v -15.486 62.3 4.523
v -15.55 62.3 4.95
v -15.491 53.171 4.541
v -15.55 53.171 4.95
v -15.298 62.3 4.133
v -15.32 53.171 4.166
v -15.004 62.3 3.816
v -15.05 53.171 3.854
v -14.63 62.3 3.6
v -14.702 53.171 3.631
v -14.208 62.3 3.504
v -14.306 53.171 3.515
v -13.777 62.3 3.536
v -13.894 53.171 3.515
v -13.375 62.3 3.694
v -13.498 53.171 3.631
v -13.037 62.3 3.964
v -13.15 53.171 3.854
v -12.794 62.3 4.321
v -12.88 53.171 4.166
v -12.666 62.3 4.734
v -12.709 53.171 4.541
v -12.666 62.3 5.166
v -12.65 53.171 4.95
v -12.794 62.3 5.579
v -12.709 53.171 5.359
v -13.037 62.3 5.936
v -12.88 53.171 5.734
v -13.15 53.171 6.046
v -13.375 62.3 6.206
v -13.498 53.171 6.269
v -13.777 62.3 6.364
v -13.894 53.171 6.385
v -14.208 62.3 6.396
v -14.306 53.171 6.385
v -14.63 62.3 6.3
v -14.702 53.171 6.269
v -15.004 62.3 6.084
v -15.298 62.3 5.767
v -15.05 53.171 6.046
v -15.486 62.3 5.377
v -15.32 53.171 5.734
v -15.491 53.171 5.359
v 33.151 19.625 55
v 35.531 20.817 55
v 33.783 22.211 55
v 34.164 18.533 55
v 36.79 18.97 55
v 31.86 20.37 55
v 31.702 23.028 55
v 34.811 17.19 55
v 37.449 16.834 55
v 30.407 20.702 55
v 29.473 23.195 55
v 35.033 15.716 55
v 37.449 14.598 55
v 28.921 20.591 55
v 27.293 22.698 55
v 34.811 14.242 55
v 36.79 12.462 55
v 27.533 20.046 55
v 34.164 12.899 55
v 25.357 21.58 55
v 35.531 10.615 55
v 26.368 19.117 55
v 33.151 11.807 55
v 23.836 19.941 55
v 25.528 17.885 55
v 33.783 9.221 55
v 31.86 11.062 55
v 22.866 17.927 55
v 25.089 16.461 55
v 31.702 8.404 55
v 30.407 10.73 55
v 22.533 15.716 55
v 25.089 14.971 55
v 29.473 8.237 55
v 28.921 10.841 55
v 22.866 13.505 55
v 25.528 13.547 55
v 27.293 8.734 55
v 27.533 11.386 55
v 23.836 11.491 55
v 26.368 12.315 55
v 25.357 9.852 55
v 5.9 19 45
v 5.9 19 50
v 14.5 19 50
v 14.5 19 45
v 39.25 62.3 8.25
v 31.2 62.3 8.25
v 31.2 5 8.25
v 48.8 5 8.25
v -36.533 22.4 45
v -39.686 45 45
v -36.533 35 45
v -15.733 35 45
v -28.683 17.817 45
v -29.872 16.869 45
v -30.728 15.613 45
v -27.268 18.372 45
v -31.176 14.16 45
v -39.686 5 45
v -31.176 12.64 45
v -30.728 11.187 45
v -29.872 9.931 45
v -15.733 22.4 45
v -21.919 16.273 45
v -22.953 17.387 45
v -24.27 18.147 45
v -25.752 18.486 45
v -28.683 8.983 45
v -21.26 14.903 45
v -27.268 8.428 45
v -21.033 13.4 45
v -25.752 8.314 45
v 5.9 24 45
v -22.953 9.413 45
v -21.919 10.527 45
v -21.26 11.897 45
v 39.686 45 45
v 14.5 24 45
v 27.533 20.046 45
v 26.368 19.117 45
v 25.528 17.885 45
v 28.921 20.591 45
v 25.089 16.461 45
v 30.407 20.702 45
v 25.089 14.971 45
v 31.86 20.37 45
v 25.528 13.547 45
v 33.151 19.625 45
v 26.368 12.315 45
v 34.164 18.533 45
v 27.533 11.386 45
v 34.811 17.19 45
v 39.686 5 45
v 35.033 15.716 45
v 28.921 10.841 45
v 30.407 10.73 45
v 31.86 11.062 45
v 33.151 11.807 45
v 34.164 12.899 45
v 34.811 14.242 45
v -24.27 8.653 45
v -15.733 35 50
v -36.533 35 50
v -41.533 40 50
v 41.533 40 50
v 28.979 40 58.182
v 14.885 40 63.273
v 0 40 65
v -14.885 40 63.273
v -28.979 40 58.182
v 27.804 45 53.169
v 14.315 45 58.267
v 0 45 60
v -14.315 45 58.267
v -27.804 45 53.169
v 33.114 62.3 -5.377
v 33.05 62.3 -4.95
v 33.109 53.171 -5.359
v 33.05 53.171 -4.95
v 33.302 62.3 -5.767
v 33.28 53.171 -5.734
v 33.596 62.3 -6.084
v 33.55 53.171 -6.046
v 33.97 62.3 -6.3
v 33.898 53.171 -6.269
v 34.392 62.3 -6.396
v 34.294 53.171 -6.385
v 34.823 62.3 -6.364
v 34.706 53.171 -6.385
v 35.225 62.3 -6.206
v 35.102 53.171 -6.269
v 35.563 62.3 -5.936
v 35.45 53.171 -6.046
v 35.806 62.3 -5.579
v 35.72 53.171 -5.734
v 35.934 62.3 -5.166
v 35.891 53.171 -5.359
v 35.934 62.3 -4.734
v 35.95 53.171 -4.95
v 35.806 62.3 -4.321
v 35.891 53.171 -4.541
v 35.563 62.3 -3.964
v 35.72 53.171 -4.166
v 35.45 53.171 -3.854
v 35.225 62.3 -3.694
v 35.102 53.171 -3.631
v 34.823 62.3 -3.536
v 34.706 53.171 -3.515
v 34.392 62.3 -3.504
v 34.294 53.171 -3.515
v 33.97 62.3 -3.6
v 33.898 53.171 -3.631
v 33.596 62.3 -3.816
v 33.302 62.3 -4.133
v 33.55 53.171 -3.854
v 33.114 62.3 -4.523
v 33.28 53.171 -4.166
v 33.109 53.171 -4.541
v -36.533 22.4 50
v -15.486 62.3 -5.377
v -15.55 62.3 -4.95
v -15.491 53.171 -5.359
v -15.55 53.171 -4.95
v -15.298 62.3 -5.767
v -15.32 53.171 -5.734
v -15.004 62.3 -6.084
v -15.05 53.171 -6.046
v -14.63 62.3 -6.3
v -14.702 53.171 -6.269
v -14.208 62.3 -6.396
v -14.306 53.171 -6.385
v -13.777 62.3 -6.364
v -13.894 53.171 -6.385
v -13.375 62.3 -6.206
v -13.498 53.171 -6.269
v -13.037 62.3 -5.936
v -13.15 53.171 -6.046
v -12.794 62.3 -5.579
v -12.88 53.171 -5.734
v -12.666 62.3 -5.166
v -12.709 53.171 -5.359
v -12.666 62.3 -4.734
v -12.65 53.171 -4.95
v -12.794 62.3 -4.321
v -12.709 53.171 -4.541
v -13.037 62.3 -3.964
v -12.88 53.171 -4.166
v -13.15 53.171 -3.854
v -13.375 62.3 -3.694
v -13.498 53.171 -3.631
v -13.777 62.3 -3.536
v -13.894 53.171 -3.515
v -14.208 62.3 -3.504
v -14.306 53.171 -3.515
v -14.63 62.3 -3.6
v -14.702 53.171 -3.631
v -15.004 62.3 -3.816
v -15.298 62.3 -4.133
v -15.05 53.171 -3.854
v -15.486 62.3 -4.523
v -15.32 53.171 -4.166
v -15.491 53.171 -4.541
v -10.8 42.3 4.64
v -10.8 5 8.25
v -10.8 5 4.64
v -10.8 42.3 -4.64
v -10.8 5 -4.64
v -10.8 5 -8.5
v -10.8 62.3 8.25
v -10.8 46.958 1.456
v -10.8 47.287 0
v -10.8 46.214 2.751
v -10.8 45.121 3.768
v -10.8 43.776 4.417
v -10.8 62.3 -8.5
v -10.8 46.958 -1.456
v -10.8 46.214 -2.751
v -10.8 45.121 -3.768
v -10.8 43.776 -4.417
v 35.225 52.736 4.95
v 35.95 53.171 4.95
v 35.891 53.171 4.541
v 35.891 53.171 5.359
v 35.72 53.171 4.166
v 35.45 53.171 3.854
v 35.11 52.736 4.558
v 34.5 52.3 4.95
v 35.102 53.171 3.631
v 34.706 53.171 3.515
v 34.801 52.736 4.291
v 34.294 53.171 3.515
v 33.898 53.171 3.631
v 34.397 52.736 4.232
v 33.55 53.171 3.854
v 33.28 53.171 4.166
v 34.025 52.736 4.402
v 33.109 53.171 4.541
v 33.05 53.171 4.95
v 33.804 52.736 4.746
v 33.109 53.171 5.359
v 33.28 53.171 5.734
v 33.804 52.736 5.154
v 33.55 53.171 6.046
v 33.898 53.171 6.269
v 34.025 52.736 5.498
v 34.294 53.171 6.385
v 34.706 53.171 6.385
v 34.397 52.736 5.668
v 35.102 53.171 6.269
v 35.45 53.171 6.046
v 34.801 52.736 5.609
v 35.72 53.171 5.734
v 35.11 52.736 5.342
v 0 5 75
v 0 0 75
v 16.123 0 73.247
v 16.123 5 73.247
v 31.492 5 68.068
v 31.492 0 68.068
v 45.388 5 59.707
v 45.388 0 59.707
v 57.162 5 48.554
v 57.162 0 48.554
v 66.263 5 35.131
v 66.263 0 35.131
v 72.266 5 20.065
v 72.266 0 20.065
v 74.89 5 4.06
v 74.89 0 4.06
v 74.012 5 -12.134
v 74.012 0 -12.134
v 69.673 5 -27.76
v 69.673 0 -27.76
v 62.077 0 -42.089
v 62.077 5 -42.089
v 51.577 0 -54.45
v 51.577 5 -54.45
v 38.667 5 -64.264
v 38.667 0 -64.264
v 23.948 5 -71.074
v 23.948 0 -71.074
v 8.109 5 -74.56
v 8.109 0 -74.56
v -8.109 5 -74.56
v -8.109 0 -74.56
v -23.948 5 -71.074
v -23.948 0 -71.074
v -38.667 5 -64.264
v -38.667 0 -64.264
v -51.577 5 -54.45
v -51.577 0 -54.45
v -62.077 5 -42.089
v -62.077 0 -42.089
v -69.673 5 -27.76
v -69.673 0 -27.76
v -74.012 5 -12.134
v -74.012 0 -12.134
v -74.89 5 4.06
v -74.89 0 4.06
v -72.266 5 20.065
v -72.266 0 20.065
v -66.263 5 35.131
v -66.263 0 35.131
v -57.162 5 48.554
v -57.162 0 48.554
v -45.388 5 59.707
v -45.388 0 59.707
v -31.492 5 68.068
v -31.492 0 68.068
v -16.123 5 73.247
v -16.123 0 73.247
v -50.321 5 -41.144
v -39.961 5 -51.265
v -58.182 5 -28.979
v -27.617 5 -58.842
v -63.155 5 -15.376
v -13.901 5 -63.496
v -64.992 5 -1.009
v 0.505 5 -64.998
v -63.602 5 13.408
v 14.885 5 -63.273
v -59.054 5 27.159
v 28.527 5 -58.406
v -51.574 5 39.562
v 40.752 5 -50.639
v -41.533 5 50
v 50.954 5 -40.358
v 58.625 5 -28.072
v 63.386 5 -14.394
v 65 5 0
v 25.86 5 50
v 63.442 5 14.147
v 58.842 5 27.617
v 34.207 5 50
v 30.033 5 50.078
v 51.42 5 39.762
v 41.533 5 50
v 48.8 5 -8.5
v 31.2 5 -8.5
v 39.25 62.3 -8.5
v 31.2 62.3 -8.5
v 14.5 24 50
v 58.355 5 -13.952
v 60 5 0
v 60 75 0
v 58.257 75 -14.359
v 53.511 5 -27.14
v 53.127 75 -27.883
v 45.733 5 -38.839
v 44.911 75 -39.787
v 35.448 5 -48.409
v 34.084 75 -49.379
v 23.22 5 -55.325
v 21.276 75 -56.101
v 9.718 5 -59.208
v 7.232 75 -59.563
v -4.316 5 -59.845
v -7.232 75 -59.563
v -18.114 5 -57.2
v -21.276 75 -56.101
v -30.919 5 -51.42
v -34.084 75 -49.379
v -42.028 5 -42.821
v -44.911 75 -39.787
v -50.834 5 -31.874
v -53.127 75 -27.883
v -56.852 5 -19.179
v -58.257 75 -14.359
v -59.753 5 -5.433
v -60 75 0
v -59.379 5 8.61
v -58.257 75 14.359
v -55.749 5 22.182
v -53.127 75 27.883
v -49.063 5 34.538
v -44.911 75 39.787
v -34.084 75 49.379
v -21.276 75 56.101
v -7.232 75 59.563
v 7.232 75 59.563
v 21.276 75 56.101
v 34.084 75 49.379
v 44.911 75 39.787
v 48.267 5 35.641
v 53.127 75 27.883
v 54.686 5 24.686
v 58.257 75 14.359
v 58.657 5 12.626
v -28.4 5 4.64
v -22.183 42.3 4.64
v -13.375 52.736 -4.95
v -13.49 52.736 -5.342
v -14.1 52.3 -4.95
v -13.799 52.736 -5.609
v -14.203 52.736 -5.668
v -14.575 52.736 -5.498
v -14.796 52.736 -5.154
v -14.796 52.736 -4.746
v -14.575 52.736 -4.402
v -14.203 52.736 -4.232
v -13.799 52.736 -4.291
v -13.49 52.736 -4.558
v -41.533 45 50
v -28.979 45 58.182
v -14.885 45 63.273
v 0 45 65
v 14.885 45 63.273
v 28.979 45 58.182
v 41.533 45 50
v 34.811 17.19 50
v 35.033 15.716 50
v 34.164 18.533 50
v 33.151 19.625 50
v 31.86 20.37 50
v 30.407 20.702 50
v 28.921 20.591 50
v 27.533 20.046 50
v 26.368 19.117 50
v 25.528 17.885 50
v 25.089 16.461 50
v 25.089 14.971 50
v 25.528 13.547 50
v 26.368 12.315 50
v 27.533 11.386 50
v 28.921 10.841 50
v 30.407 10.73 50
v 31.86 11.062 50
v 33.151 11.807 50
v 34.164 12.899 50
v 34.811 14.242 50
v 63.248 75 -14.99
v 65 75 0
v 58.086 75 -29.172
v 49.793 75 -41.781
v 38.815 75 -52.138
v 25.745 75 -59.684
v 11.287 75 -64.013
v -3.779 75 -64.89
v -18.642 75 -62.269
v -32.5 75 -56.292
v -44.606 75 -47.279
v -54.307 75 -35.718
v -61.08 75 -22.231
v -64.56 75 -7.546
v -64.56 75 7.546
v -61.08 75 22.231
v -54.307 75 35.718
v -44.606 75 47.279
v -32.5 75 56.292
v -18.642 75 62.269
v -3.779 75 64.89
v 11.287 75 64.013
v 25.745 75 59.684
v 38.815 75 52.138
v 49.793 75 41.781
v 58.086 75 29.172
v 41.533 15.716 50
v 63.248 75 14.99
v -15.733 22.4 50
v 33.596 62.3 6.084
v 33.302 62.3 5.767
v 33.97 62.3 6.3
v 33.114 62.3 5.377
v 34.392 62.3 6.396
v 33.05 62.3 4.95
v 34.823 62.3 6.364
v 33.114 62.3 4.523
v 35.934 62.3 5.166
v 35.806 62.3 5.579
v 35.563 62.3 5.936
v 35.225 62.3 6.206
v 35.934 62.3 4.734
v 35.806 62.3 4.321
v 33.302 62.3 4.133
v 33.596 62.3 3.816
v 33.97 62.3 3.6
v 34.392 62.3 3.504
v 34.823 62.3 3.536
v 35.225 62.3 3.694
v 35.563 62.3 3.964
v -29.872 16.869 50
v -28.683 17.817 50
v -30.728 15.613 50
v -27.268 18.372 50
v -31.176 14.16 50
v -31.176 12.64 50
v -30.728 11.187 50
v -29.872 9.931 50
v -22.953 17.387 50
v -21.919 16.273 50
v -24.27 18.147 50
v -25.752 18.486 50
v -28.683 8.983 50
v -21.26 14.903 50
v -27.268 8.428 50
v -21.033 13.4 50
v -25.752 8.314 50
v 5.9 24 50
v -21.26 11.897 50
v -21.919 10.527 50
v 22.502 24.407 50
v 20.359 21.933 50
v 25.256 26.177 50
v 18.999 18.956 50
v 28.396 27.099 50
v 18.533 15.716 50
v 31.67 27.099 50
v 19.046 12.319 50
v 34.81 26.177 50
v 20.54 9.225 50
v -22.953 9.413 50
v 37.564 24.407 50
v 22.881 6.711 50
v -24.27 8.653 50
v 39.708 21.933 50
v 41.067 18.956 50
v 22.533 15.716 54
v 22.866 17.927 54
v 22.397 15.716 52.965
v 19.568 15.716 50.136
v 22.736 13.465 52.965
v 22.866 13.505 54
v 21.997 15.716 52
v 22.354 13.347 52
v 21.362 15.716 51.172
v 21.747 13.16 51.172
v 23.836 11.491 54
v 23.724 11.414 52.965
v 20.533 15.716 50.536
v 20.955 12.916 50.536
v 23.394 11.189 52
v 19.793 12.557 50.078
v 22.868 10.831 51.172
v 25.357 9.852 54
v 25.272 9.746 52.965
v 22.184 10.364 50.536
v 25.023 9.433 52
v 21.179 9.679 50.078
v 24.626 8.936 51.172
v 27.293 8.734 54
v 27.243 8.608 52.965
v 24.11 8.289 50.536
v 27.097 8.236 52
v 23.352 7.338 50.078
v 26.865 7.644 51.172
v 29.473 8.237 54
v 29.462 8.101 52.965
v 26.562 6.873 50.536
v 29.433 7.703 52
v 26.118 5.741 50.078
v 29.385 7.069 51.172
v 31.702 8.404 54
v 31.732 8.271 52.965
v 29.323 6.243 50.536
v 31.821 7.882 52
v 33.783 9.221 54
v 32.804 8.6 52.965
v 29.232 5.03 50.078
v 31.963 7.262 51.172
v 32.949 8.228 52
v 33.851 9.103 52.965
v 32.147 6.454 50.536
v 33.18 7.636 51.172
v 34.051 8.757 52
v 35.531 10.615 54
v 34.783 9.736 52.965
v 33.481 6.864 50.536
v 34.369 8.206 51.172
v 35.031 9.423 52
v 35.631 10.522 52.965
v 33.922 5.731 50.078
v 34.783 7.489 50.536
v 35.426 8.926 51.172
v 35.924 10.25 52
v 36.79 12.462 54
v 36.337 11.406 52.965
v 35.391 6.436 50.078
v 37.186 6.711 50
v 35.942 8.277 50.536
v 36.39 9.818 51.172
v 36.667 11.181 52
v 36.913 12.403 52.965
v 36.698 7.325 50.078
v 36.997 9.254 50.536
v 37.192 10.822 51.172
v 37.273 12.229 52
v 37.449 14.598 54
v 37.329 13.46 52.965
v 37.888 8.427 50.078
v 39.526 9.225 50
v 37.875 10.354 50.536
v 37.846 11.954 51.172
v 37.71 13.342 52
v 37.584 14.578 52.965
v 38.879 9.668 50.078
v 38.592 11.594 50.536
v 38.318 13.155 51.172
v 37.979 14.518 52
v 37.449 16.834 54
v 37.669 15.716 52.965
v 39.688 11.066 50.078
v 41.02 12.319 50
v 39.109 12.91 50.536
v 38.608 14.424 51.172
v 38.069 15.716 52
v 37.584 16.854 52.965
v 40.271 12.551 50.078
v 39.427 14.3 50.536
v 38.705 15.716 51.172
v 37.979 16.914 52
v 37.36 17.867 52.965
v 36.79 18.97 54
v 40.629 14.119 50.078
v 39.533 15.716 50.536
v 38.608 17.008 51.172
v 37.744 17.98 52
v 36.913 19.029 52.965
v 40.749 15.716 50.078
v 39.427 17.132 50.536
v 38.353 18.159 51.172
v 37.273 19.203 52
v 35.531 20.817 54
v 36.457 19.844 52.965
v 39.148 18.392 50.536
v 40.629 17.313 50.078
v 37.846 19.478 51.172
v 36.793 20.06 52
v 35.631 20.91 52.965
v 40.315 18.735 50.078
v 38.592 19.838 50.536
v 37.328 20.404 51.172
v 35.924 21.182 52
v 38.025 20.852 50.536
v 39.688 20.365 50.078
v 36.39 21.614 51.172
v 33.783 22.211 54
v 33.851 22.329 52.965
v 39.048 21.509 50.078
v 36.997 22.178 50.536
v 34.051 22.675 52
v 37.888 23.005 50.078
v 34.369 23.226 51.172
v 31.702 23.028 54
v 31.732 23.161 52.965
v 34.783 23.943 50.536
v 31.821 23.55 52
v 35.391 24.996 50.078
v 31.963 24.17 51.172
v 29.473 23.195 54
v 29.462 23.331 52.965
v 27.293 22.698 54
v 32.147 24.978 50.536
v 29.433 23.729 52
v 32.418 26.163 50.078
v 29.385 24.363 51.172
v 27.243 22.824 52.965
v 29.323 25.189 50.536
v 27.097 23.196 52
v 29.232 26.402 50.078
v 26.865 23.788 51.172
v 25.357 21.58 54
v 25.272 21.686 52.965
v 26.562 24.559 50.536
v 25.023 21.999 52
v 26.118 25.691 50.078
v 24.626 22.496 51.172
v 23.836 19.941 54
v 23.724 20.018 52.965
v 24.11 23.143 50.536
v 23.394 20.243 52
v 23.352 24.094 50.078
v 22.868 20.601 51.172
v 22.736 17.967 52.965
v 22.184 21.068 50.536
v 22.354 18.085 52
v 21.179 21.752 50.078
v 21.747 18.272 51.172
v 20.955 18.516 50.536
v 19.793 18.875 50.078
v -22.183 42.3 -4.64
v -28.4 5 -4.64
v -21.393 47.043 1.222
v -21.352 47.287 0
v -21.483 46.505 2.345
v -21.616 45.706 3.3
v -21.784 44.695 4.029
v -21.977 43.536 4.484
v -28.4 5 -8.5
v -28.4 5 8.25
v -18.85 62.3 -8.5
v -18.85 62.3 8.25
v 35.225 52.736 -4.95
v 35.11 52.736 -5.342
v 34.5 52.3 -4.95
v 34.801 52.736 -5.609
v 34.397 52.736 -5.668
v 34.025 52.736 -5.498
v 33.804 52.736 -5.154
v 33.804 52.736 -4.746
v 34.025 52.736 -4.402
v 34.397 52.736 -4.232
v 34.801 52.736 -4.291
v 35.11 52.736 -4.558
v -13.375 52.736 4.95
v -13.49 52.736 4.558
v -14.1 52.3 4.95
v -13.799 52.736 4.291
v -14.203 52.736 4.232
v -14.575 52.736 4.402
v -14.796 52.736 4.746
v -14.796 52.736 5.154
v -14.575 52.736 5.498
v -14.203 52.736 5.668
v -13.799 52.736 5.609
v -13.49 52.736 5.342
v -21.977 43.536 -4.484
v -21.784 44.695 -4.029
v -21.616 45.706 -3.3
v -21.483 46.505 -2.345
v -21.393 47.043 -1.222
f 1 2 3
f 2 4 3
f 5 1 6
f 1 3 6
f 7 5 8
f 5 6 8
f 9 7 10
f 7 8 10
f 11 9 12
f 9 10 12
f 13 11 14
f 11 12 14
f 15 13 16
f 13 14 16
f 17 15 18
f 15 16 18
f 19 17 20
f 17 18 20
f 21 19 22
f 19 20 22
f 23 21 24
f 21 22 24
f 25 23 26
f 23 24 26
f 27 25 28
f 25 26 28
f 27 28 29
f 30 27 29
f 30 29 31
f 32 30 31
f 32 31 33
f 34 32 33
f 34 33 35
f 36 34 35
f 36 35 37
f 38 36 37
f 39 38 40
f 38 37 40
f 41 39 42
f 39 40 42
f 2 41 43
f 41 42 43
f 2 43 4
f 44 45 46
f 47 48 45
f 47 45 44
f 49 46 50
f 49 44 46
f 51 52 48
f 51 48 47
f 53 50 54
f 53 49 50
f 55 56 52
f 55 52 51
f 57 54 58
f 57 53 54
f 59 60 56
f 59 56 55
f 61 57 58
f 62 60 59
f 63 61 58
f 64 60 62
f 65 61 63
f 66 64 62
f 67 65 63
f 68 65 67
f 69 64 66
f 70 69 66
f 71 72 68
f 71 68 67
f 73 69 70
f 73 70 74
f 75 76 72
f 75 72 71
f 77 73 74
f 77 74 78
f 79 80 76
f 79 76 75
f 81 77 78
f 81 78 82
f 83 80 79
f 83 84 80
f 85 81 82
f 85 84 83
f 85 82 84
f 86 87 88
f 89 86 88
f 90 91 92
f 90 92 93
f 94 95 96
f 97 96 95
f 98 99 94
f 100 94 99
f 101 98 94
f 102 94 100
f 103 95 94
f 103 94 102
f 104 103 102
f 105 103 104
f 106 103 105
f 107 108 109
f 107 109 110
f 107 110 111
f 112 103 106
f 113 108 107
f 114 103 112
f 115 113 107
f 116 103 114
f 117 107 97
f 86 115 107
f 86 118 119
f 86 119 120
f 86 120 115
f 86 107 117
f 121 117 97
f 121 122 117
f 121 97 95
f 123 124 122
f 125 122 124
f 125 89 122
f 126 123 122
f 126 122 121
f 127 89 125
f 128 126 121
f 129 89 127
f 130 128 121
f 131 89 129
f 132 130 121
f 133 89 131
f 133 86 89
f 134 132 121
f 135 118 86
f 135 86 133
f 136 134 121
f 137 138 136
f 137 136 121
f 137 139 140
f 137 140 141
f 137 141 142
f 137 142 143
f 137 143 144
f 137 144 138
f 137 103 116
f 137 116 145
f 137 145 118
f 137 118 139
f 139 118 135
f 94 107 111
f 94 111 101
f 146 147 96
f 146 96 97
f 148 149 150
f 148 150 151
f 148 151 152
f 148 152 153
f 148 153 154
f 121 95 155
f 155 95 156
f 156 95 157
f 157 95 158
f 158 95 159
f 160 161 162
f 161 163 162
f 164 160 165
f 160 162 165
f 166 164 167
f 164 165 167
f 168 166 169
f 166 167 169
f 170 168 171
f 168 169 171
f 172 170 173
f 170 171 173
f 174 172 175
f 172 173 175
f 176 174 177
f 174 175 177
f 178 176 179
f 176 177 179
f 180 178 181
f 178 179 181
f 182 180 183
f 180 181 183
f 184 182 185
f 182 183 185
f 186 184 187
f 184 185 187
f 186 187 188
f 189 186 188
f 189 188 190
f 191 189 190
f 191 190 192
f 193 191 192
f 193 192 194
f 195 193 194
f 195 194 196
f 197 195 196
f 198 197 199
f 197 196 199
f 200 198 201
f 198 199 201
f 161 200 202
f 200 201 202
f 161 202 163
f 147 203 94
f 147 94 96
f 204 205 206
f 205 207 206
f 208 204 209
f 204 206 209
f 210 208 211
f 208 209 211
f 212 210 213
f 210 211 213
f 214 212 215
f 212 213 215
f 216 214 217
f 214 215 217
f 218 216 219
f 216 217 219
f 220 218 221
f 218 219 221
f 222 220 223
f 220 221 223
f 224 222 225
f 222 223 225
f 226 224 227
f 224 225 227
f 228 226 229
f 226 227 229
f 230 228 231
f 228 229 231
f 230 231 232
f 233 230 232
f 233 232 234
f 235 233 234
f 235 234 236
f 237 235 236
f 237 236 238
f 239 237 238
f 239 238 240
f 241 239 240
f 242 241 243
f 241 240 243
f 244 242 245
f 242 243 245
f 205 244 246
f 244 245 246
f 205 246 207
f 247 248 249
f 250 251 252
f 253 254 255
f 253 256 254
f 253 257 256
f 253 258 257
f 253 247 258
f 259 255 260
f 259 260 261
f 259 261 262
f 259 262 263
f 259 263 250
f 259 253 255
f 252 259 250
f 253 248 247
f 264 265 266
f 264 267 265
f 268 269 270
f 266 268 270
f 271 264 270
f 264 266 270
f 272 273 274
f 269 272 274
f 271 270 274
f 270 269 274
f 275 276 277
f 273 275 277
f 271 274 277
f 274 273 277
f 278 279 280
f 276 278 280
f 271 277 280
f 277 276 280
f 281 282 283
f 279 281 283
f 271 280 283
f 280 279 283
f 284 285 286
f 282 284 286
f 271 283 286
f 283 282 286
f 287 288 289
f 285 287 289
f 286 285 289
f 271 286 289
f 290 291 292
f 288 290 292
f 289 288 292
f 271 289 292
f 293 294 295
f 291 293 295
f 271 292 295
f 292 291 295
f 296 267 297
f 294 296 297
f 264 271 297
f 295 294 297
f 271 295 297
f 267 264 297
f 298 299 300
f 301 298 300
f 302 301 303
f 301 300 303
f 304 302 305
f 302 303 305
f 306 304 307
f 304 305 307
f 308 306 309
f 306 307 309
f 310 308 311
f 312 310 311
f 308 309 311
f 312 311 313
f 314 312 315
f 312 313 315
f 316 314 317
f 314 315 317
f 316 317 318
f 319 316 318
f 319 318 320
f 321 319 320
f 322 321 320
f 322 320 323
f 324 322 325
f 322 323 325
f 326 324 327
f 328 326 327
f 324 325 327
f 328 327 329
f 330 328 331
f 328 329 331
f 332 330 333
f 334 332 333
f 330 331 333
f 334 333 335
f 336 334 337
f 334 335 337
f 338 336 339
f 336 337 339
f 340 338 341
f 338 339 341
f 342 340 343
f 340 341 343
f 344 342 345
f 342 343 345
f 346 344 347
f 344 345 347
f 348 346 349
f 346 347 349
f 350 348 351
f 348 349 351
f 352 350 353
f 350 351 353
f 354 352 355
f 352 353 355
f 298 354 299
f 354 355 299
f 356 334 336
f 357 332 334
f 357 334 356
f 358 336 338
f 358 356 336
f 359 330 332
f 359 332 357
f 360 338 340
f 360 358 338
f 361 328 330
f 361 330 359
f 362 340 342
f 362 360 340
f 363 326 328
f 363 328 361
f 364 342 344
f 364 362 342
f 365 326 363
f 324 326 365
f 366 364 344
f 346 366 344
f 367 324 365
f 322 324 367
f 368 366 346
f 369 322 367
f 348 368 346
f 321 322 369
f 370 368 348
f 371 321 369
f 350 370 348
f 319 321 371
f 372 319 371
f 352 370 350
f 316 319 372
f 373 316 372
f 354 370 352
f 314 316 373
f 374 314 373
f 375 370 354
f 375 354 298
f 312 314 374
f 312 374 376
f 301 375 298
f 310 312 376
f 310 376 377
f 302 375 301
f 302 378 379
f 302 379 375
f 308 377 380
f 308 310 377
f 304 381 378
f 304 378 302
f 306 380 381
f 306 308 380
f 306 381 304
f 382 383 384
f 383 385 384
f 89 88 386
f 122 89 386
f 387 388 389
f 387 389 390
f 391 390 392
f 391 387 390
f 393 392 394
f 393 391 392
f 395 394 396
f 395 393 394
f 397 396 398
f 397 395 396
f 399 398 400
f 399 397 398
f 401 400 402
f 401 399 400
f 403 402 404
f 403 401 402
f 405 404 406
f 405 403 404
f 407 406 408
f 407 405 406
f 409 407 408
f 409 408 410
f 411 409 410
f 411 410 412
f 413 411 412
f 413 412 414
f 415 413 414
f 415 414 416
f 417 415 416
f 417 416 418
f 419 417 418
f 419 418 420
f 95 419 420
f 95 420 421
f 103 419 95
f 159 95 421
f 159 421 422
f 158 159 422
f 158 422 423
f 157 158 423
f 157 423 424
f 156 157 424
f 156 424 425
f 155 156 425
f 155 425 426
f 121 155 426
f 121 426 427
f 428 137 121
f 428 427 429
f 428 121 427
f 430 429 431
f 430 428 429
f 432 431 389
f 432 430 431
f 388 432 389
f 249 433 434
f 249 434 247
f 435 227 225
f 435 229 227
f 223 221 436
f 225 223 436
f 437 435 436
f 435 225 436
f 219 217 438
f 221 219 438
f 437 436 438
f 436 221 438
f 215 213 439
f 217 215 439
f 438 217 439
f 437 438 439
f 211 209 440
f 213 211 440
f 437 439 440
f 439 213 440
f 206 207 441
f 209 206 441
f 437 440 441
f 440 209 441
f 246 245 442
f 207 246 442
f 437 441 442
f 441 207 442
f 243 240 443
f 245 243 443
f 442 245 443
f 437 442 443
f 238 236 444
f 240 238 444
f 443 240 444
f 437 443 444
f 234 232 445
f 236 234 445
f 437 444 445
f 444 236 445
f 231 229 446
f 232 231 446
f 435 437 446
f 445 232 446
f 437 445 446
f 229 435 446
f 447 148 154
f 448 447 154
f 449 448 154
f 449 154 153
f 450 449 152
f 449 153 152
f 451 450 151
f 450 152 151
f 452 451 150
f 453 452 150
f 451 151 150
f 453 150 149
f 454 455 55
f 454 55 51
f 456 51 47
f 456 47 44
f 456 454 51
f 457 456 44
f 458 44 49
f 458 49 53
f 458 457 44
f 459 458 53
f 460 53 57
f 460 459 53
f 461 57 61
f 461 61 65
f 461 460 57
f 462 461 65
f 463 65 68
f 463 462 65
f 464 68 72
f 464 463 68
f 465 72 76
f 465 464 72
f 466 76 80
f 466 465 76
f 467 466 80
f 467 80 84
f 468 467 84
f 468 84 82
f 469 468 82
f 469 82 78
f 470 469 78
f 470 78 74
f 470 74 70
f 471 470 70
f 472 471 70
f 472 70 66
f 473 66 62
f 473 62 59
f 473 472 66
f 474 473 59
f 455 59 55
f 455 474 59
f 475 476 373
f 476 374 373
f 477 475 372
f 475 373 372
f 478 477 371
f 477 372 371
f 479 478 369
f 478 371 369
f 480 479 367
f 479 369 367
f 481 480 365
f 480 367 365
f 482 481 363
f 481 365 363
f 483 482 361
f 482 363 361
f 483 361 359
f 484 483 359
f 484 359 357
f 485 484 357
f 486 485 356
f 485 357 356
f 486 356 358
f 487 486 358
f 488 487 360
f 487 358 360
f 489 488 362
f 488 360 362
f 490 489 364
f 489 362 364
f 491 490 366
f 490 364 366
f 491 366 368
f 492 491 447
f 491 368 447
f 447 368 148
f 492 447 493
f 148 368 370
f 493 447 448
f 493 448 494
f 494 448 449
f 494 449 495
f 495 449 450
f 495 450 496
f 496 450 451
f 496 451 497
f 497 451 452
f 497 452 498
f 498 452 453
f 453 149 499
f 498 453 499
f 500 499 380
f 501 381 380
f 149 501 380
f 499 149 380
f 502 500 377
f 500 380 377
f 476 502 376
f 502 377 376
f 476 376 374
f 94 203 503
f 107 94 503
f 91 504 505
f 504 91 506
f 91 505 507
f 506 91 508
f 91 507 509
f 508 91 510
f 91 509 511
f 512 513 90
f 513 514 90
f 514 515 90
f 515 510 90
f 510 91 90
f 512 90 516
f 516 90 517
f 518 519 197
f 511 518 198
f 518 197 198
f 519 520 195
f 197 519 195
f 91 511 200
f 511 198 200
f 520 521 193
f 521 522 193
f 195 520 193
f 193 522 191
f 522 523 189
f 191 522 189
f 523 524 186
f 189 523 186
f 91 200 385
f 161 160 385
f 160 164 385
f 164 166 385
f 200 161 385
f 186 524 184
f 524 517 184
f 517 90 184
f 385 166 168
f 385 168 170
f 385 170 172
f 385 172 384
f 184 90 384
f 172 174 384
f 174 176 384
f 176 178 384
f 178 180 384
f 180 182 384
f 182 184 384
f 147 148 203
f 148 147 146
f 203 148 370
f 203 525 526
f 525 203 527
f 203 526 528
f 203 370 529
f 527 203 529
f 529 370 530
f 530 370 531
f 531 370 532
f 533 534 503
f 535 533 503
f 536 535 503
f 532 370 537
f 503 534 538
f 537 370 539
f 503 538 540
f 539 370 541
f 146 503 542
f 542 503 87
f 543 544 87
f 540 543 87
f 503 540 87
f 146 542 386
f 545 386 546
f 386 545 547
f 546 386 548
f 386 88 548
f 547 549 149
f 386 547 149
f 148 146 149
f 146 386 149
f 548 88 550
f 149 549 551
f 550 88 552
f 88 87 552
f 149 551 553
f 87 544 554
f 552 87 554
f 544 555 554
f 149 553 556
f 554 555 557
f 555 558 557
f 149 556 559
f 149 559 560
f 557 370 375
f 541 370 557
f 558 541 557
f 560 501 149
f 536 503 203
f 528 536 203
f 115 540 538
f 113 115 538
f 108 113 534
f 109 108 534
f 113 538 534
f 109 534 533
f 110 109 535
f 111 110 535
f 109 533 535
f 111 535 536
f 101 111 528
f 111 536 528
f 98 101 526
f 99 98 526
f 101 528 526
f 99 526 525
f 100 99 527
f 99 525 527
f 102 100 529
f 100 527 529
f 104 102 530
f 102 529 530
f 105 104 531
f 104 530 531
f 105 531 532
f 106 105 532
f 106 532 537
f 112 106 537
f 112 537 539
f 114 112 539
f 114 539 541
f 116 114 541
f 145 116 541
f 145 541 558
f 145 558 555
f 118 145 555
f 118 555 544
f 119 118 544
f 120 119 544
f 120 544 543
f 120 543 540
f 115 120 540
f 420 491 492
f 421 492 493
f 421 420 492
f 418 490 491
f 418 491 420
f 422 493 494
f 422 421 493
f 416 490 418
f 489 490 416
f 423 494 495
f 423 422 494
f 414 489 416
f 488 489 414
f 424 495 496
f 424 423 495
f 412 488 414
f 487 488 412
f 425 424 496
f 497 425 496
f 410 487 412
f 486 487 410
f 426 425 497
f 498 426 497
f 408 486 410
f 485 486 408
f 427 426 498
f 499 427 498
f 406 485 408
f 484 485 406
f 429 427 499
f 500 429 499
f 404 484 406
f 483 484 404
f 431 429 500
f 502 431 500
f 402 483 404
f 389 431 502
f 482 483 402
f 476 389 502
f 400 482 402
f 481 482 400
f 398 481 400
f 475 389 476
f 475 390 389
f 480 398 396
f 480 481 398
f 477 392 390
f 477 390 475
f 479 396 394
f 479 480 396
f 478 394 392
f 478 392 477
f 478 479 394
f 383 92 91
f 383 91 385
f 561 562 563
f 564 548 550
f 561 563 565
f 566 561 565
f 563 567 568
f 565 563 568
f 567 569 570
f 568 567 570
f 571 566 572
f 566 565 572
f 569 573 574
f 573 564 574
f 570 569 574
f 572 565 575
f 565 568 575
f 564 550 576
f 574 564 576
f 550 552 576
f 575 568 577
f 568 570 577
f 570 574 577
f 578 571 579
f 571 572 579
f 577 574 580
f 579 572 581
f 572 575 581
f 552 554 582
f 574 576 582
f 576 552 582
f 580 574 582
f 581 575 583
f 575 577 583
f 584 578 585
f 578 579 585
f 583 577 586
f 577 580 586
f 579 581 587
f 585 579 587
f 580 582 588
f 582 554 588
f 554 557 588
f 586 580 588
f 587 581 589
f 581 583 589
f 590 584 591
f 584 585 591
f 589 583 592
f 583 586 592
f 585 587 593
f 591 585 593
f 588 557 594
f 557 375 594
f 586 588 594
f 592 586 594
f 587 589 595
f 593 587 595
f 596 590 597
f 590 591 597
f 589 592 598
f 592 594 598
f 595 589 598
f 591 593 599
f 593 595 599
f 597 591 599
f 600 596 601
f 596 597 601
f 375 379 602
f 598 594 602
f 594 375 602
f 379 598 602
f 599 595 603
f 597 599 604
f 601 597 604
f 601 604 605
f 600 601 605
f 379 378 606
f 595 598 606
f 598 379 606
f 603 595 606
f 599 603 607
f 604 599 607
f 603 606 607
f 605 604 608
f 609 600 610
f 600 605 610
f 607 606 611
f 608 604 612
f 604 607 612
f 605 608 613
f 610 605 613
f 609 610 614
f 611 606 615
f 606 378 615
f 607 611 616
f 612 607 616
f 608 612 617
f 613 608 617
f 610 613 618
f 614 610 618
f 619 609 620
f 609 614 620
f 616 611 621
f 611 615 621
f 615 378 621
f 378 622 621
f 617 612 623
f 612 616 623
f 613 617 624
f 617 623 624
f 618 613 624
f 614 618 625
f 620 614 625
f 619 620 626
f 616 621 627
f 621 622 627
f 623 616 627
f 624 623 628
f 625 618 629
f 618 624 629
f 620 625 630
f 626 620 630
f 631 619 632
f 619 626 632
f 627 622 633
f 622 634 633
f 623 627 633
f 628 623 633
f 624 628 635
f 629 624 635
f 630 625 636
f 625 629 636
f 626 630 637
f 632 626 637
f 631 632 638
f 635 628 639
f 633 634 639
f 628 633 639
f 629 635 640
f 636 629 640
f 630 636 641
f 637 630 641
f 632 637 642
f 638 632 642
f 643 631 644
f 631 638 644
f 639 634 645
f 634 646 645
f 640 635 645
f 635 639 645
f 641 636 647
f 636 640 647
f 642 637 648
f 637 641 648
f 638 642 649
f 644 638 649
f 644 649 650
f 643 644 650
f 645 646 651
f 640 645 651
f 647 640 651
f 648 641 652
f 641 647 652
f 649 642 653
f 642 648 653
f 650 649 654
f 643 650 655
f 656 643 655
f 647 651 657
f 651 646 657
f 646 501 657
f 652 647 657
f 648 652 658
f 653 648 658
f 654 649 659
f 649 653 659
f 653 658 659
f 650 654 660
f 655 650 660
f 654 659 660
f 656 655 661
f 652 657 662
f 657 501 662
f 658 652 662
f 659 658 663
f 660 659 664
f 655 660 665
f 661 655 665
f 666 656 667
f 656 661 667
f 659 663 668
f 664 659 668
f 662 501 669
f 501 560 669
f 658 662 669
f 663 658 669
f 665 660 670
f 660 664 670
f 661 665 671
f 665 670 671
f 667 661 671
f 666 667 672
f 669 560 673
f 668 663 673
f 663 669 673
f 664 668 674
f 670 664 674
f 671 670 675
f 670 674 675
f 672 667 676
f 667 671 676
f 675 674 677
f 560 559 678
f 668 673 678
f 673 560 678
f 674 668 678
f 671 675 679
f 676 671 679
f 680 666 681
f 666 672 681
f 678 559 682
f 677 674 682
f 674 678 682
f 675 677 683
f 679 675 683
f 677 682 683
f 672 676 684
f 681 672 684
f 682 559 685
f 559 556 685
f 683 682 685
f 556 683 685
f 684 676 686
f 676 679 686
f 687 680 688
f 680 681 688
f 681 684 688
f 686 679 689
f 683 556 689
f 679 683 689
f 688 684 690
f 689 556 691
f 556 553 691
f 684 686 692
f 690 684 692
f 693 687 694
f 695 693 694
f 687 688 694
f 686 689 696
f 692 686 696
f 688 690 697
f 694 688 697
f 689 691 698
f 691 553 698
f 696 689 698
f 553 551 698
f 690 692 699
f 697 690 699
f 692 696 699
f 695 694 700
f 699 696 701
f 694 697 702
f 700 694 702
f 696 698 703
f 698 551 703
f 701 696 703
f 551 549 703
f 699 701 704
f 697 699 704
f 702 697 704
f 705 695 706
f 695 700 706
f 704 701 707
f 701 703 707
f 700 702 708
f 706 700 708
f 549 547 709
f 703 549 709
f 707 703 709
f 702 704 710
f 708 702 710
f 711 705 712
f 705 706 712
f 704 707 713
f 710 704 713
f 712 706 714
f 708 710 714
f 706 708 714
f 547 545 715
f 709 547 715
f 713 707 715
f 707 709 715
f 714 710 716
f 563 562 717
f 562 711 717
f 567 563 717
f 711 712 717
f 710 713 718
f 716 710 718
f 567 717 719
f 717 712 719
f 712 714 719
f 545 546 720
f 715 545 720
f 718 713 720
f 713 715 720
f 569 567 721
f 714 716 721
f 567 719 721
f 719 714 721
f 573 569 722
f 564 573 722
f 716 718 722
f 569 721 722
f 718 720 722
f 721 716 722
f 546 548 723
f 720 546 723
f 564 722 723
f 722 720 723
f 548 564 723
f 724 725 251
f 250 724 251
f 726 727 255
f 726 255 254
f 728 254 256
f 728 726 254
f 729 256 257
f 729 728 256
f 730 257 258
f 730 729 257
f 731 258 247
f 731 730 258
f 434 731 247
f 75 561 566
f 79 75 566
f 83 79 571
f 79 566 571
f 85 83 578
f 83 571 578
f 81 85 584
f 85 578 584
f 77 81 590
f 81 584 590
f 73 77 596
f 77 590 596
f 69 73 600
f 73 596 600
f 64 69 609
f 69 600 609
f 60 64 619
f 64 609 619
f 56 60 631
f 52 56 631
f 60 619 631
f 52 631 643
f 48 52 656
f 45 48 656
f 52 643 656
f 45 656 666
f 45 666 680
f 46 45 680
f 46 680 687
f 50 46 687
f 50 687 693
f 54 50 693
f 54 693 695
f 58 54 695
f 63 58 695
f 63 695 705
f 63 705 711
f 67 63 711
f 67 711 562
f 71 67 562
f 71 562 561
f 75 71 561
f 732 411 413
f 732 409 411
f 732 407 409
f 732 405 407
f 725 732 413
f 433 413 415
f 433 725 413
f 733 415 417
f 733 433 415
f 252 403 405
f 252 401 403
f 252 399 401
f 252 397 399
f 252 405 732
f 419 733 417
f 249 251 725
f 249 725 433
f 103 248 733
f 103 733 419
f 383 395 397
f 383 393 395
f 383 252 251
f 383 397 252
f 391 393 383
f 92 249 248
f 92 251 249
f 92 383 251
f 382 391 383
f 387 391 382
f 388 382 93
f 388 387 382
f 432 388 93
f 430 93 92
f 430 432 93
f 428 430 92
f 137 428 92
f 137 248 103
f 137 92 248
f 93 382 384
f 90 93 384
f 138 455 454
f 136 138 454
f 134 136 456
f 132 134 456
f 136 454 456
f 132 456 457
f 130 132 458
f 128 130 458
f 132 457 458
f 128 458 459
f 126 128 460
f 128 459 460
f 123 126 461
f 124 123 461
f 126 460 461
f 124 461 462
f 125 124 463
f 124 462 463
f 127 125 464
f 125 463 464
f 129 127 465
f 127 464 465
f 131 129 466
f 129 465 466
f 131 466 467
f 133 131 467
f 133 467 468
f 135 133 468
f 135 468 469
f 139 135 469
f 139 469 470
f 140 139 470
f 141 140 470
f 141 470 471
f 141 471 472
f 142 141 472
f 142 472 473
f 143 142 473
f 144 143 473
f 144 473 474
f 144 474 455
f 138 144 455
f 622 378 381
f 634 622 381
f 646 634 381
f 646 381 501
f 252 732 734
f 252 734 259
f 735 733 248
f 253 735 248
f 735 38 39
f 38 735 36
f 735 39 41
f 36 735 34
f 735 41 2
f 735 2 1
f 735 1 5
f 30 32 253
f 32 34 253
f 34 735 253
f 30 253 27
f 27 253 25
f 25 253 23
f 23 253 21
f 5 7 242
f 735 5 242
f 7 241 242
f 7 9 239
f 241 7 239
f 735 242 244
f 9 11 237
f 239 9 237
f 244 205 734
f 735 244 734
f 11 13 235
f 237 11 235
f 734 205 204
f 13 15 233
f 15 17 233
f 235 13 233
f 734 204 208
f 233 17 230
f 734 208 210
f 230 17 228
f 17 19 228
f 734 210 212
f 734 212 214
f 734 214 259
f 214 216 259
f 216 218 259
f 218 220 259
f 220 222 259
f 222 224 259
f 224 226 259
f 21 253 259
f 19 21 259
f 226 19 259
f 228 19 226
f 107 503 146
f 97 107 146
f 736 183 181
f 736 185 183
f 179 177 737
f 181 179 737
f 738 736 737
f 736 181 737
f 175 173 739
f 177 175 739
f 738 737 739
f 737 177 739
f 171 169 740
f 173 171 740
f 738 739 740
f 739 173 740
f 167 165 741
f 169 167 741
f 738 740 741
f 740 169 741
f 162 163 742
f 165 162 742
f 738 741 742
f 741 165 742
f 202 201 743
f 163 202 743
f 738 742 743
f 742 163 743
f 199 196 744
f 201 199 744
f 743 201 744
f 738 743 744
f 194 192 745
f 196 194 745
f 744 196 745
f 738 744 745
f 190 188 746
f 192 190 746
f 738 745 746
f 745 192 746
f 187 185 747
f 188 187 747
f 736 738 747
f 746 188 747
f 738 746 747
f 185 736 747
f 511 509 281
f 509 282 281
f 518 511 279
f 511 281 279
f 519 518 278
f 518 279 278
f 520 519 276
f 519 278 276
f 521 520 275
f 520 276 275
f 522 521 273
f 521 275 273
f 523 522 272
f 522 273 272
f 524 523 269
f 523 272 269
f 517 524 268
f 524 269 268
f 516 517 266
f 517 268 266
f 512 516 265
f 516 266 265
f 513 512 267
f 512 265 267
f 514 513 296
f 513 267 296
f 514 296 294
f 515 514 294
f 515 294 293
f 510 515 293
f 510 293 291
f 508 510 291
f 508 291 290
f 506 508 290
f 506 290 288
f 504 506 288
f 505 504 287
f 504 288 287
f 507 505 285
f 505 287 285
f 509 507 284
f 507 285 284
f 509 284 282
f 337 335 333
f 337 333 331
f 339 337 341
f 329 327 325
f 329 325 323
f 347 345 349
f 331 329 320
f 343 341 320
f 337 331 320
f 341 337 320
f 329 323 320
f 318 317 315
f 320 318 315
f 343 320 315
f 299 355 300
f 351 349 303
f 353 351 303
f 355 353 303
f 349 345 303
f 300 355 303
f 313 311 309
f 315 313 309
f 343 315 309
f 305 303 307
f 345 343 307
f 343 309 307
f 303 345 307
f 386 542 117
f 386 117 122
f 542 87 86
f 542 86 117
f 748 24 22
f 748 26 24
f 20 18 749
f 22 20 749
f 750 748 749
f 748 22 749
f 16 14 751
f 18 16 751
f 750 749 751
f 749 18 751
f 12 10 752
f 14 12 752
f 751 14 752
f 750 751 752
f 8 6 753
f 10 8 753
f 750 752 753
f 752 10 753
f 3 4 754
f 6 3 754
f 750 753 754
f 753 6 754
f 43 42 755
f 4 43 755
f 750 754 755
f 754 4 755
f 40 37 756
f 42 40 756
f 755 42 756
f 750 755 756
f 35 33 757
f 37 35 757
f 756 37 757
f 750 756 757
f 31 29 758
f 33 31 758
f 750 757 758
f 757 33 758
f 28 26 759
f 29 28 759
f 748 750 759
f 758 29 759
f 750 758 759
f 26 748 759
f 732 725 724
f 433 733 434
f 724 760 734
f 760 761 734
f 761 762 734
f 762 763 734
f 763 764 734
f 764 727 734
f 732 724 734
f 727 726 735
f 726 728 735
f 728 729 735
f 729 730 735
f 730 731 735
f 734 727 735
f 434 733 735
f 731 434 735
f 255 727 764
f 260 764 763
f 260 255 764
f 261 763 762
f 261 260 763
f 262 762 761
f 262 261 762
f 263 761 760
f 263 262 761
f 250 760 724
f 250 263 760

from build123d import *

# Parameters (mm, degrees)
SKETCH4_R                   = 65
SKETCH4_R_2                 = 60
EXTRUDE_THIN1_DEPTH         = 75
SKETCH5_R                   = 75
BOSS_EXTRUDE1_DEPTH         = 5
BOSS_EXTRUDE2_START         = -40
SKETCH6_W                   = 83.06623863
SKETCH6_H                   = 5
BOSS_EXTRUDE2_DEPTH         = 40
CUT_EXTRUDE1_START          = -40
CUT_EXTRUDE1_DEPTH          = 35
SKETCH8_W                   = 7.6
SKETCH8_H                   = 16.75
BOSS_EXTRUDE3_DEPTH         = 57.3
CHAMFER1_SIZE               = 10
CHAMFER1_SIZE_2             = 60
M3_5X0_6_TAPPED_HOLE1_D     = 2.9
M3_5X0_6_TAPPED_HOLE1_DEPTH = 9.128752102
M3_5X0_6_TAPPED_HOLE1_TIP   = 0.871247898
CUT_EXTRUDE2_START          = -57.3
SKETCH11_W                  = 18.622960368
SKETCH11_H                  = 9.279079534
CUT_EXTRUDE2_DEPTH          = 42.3
FILLET1_R                   = 5
CUT_EXTRUDE3_REACH          = 165.936
SKETCH12_R                  = 5.1
SKETCH12_W                  = 20.8
SKETCH12_H                  = 12.6
SKETCH12_W_2                = 8.6
SKETCH12_H_2                = 5
SKETCH13_R                  = 7.5
SKETCH13_R_2                = 5
BOSS_EXTRUDE4_DEPTH         = 5
FILLET2_R                   = 4
CUT_EXTRUDE4_REACH          = 165.936
SKETCH14_R                  = 5


with BuildPart() as part:
    # Sketch4 → Extrude-Thin1 (new body)
    with BuildSketch(Plane(origin=(0, 0, 0), x_dir=(1, 0, 0), z_dir=(0, 1, 0))):
        Circle(SKETCH4_R)
        Circle(SKETCH4_R_2, mode=Mode.SUBTRACT)
    extrude(amount=EXTRUDE_THIN1_DEPTH)

    # Sketch5 → Boss-Extrude1 (add)
    with BuildSketch(Plane(origin=(0, 0, 0), x_dir=(1, 0, 0), z_dir=(0, 1, 0))):
        with Locations(Location((0, 0, 0), (0, 0, 270))):
            Circle(SKETCH5_R)
    extrude(amount=BOSS_EXTRUDE1_DEPTH)

    # Sketch6 → Boss-Extrude2 (add)
    with BuildSketch(Plane(origin=(0, 45, 0), x_dir=(1, 0, 0), z_dir=(0, 1, 0)).offset(BOSS_EXTRUDE2_START)):
        with Locations((0, -47.5)):
            Rectangle(SKETCH6_W, SKETCH6_H)
        with BuildLine():
            Line((41.533119315, -50), (0, -50))
            Line((0, -50), (0, -65))
            ThreePointArc((0, -65), (22.079402166, -61.135096303), (41.533119315, -50))
        make_face()
        with BuildLine():
            Line((0, -65), (0, -50))
            Line((0, -50), (-41.533119315, -50))
            ThreePointArc((-41.533119315, -50), (-22.079402166, -61.135096303), (0, -65))
        make_face()
        with BuildLine():
            Line((41.533119315, -50), (0, -50))
            Line((0, -50), (0, -65))
            ThreePointArc((0, -65), (22.079402166, -61.135096303), (41.533119315, -50))
        make_face()
        with BuildLine():
            Line((0, -65), (0, -50))
            Line((0, -50), (-41.533119315, -50))
            ThreePointArc((-41.533119315, -50), (-22.079402166, -61.135096303), (0, -65))
        make_face()
    extrude(amount=BOSS_EXTRUDE2_DEPTH)

    # Sketch7 → Cut-Extrude1 (cut)
    with BuildSketch(Plane(origin=(0, 45, 0), x_dir=(1, 0, 0), z_dir=(0, 1, 0)).offset(CUT_EXTRUDE1_START)):
        with BuildLine():
            Line((-41.533119315, -50), (41.533119315, -50))
            ThreePointArc((41.533119315, -50), (0, -65), (-41.533119315, -50))
        make_face()
    extrude(amount=CUT_EXTRUDE1_DEPTH, mode=Mode.SUBTRACT)

    # Sketch8 → Boss-Extrude3 (add)
    with BuildSketch(Plane(origin=(0, 5, 0), x_dir=(1, 0, 0), z_dir=(0, 1, 0))):
        with Locations((35, 0.125)):
            Rectangle(SKETCH8_W, SKETCH8_H)
        with Locations((-14.6, 0.125)):
            Rectangle(SKETCH8_W, SKETCH8_H)
    extrude(amount=BOSS_EXTRUDE3_DEPTH)

    # Chamfer1
    # the kernel refuses this chamfer: 60, 10 mm, written as the material it adds along each edge
    with BuildSketch(Plane(origin=(38.8, 5, -8.5), x_dir=(0.9750324932942595, -0.2220622368174739, 0), z_dir=(0, 0, 1))) as chamfer1_piece_1_section:
        Polygon((CHAMFER1_SIZE * 0.975032493294, CHAMFER1_SIZE * 0.222062236817), (-CHAMFER1_SIZE_2 * 0.222062236817, CHAMFER1_SIZE_2 * 0.975032493294), (0, 0), align=None)
    chamfer1_piece_1 = extrude(amount=16.75, mode=Mode.PRIVATE)
    chamfer1_piece_1 = split(chamfer1_piece_1, bisect_by=Plane(origin=(41.528502242, 62.3, -0.125), z_dir=(0, -1, 0)), keep=Keep.TOP, mode=Mode.PRIVATE)
    add(chamfer1_piece_1)
    with BuildSketch(Plane(origin=(-18.4, 5, -8.5), x_dir=(-0.9750324932942595, -0.2220622368174739, 0), z_dir=(0, 0, 1))) as chamfer1_piece_2_section:
        Polygon((CHAMFER1_SIZE * 0.975032493294, -CHAMFER1_SIZE * 0.222062236817), (-CHAMFER1_SIZE_2 * 0.222062236817, -CHAMFER1_SIZE_2 * 0.975032493294), (0, 0), align=None)
    chamfer1_piece_2 = extrude(amount=16.75, mode=Mode.PRIVATE)
    chamfer1_piece_2 = split(chamfer1_piece_2, bisect_by=Plane(origin=(-21.128502242, 62.3, -0.125), z_dir=(0, -1, 0)), keep=Keep.TOP, mode=Mode.PRIVATE)
    add(chamfer1_piece_2)

    # M3.5x0.6 Tapped Hole1
    with Locations(Plane(origin=(0, 62.3, 0), x_dir=(1, 0, 0), z_dir=(0, 1, 0))):
        with Locations((34.5, 4.95), (34.5, -4.95), (-14.1, 4.95), (-14.1, -4.95)):
            Hole(M3_5X0_6_TAPPED_HOLE1_D / 2, depth=M3_5X0_6_TAPPED_HOLE1_DEPTH)
            with Locations((0, 0, -(M3_5X0_6_TAPPED_HOLE1_DEPTH + M3_5X0_6_TAPPED_HOLE1_TIP / 2))):  # 118° drill point
                Cone(0, M3_5X0_6_TAPPED_HOLE1_D / 2, M3_5X0_6_TAPPED_HOLE1_TIP, mode=Mode.SUBTRACT)

    # Sketch11 → Cut-Extrude2 (cut)
    with BuildSketch(Plane(origin=(0, 62.3, 0), x_dir=(1, 0, 0), z_dir=(0, 1, 0)).offset(CUT_EXTRUDE2_START)):
        with Locations((-19.088519816, 0)):
            Rectangle(SKETCH11_W, SKETCH11_H)
    extrude(amount=CUT_EXTRUDE2_DEPTH, mode=Mode.SUBTRACT)

    # Fillet1
    # the kernel refuses this fillet: 5 mm, written as the material it adds along each edge
    with BuildSketch(Plane(origin=(-10.8, 47.3, -4.639539767), x_dir=(0, 0, 1), z_dir=(-1, 0, 0))) as fillet1_piece_1_section:
        with BuildLine():
            CenterArc((FILLET1_R, -FILLET1_R), FILLET1_R, 90, 90)
            Line((0, -FILLET1_R), (0, 0))
            Line((0, 0), (FILLET1_R, 0))
        make_face()
    fillet1_piece_1 = extrude(amount=23.05, mode=Mode.PRIVATE)
    fillet1_piece_1 = split(fillet1_piece_1, bisect_by=Plane(origin=(-21.396510454, 47.020937275, -3.518217567), z_dir=(0.9863939238321439, -0.1643989873053573, 0)), keep=Keep.TOP, mode=Mode.PRIVATE)
    add(fillet1_piece_1)
    with BuildSketch(Plane(origin=(-33.85, 47.3, 4.639539767), x_dir=(0, -1, 0), z_dir=(1, 0, 0))) as fillet1_piece_2_section:
        with BuildLine():
            CenterArc((FILLET1_R, FILLET1_R), FILLET1_R, 180, 90)
            Line((0, FILLET1_R), (0, 0))
            Line((0, 0), (FILLET1_R, 0))
        make_face()
    fillet1_piece_2 = extrude(amount=23.05, mode=Mode.PRIVATE)
    fillet1_piece_2 = split(fillet1_piece_2, bisect_by=Plane(origin=(-21.396510454, 47.020937275, 3.518217567), z_dir=(0.9863939238321439, -0.1643989873053573, 0)), keep=Keep.TOP, mode=Mode.PRIVATE)
    add(fillet1_piece_2)

    # Sketch12 → Cut-Extrude3 (cut, up to next)
    with BuildSketch(Plane.XY.offset(50), mode=Mode.PRIVATE) as cut_extrude3_sk1:
        with Locations((-26.133119315, 13.4)):
            Circle(SKETCH12_R)
    cut_extrude3_tool1 = extrude(cut_extrude3_sk1.sketch, amount=-CUT_EXTRUDE3_REACH, mode=Mode.PRIVATE) & part.part
    # Sketch12 → Cut-Extrude3 (cut, up to next)
    with BuildSketch(Plane.XY.offset(50), mode=Mode.PRIVATE) as cut_extrude3_sk2:
        with Locations((-26.133119315, 28.7)):
            Rectangle(SKETCH12_W, SKETCH12_H)
    cut_extrude3_tool2 = extrude(cut_extrude3_sk2.sketch, amount=-CUT_EXTRUDE3_REACH, mode=Mode.PRIVATE) & part.part
    # Sketch12 → Cut-Extrude3 (cut, up to next)
    with BuildSketch(Plane.XY.offset(50), mode=Mode.PRIVATE) as cut_extrude3_sk3:
        with Locations((10.2, 21.5)):
            Rectangle(SKETCH12_W_2, SKETCH12_H_2)
    cut_extrude3_tool3 = extrude(cut_extrude3_sk3.sketch, amount=-CUT_EXTRUDE3_REACH, mode=Mode.PRIVATE) & part.part
    add(cut_extrude3_tool1.solids().sort_by_distance((-26.133119, 13.4, 50))[0], mode=Mode.SUBTRACT)
    add(cut_extrude3_tool2.solids().sort_by_distance((-26.133119, 28.7, 50))[0], mode=Mode.SUBTRACT)
    add(cut_extrude3_tool3.solids().sort_by_distance((10.2, 21.5, 50))[0], mode=Mode.SUBTRACT)

    # Sketch13 → Boss-Extrude4 (add)
    with BuildSketch(Plane.XY.offset(50)):
        with Locations(Location((30.033119315, 15.715961892, 0), (0, 0, 180))):
            Circle(SKETCH13_R)
        with Locations((30.033119315, 15.715961892)):
            Circle(SKETCH13_R_2, mode=Mode.SUBTRACT)
    extrude(amount=BOSS_EXTRUDE4_DEPTH)

    # Fillet2
    # the kernel refuses this fillet: 4 mm, written as the material it adds along each edge
    with BuildSketch(Plane(origin=(30.033119315, 15.715961892, 50), x_dir=(-1, 0, 0), z_dir=(0, 1, 0))) as fillet2_piece_1:
        with BuildLine():
            CenterArc((7.5 + FILLET2_R, FILLET2_R), FILLET2_R, 180, 90)
            Line((7.5, FILLET2_R), (7.5, 0))
            Line((7.5, 0), (7.5 + FILLET2_R, 0))
        make_face()
    revolve(axis=Axis((30.033119315, 15.715961892, 50), (0, 0, 1)))

    # Sketch14 → Cut-Extrude4 (cut, up to next)
    with BuildSketch(Plane.XY.offset(50), mode=Mode.PRIVATE) as cut_extrude4_sk1:
        with Locations((30.033119315, 15.715961892)):
            Circle(SKETCH14_R)
    cut_extrude4_tool1 = extrude(cut_extrude4_sk1.sketch, amount=-CUT_EXTRUDE4_REACH, mode=Mode.PRIVATE) & part.part
    add(cut_extrude4_tool1.solids().sort_by_distance((30.033119, 15.715962, 50))[0], mode=Mode.SUBTRACT)


solid = part.part
